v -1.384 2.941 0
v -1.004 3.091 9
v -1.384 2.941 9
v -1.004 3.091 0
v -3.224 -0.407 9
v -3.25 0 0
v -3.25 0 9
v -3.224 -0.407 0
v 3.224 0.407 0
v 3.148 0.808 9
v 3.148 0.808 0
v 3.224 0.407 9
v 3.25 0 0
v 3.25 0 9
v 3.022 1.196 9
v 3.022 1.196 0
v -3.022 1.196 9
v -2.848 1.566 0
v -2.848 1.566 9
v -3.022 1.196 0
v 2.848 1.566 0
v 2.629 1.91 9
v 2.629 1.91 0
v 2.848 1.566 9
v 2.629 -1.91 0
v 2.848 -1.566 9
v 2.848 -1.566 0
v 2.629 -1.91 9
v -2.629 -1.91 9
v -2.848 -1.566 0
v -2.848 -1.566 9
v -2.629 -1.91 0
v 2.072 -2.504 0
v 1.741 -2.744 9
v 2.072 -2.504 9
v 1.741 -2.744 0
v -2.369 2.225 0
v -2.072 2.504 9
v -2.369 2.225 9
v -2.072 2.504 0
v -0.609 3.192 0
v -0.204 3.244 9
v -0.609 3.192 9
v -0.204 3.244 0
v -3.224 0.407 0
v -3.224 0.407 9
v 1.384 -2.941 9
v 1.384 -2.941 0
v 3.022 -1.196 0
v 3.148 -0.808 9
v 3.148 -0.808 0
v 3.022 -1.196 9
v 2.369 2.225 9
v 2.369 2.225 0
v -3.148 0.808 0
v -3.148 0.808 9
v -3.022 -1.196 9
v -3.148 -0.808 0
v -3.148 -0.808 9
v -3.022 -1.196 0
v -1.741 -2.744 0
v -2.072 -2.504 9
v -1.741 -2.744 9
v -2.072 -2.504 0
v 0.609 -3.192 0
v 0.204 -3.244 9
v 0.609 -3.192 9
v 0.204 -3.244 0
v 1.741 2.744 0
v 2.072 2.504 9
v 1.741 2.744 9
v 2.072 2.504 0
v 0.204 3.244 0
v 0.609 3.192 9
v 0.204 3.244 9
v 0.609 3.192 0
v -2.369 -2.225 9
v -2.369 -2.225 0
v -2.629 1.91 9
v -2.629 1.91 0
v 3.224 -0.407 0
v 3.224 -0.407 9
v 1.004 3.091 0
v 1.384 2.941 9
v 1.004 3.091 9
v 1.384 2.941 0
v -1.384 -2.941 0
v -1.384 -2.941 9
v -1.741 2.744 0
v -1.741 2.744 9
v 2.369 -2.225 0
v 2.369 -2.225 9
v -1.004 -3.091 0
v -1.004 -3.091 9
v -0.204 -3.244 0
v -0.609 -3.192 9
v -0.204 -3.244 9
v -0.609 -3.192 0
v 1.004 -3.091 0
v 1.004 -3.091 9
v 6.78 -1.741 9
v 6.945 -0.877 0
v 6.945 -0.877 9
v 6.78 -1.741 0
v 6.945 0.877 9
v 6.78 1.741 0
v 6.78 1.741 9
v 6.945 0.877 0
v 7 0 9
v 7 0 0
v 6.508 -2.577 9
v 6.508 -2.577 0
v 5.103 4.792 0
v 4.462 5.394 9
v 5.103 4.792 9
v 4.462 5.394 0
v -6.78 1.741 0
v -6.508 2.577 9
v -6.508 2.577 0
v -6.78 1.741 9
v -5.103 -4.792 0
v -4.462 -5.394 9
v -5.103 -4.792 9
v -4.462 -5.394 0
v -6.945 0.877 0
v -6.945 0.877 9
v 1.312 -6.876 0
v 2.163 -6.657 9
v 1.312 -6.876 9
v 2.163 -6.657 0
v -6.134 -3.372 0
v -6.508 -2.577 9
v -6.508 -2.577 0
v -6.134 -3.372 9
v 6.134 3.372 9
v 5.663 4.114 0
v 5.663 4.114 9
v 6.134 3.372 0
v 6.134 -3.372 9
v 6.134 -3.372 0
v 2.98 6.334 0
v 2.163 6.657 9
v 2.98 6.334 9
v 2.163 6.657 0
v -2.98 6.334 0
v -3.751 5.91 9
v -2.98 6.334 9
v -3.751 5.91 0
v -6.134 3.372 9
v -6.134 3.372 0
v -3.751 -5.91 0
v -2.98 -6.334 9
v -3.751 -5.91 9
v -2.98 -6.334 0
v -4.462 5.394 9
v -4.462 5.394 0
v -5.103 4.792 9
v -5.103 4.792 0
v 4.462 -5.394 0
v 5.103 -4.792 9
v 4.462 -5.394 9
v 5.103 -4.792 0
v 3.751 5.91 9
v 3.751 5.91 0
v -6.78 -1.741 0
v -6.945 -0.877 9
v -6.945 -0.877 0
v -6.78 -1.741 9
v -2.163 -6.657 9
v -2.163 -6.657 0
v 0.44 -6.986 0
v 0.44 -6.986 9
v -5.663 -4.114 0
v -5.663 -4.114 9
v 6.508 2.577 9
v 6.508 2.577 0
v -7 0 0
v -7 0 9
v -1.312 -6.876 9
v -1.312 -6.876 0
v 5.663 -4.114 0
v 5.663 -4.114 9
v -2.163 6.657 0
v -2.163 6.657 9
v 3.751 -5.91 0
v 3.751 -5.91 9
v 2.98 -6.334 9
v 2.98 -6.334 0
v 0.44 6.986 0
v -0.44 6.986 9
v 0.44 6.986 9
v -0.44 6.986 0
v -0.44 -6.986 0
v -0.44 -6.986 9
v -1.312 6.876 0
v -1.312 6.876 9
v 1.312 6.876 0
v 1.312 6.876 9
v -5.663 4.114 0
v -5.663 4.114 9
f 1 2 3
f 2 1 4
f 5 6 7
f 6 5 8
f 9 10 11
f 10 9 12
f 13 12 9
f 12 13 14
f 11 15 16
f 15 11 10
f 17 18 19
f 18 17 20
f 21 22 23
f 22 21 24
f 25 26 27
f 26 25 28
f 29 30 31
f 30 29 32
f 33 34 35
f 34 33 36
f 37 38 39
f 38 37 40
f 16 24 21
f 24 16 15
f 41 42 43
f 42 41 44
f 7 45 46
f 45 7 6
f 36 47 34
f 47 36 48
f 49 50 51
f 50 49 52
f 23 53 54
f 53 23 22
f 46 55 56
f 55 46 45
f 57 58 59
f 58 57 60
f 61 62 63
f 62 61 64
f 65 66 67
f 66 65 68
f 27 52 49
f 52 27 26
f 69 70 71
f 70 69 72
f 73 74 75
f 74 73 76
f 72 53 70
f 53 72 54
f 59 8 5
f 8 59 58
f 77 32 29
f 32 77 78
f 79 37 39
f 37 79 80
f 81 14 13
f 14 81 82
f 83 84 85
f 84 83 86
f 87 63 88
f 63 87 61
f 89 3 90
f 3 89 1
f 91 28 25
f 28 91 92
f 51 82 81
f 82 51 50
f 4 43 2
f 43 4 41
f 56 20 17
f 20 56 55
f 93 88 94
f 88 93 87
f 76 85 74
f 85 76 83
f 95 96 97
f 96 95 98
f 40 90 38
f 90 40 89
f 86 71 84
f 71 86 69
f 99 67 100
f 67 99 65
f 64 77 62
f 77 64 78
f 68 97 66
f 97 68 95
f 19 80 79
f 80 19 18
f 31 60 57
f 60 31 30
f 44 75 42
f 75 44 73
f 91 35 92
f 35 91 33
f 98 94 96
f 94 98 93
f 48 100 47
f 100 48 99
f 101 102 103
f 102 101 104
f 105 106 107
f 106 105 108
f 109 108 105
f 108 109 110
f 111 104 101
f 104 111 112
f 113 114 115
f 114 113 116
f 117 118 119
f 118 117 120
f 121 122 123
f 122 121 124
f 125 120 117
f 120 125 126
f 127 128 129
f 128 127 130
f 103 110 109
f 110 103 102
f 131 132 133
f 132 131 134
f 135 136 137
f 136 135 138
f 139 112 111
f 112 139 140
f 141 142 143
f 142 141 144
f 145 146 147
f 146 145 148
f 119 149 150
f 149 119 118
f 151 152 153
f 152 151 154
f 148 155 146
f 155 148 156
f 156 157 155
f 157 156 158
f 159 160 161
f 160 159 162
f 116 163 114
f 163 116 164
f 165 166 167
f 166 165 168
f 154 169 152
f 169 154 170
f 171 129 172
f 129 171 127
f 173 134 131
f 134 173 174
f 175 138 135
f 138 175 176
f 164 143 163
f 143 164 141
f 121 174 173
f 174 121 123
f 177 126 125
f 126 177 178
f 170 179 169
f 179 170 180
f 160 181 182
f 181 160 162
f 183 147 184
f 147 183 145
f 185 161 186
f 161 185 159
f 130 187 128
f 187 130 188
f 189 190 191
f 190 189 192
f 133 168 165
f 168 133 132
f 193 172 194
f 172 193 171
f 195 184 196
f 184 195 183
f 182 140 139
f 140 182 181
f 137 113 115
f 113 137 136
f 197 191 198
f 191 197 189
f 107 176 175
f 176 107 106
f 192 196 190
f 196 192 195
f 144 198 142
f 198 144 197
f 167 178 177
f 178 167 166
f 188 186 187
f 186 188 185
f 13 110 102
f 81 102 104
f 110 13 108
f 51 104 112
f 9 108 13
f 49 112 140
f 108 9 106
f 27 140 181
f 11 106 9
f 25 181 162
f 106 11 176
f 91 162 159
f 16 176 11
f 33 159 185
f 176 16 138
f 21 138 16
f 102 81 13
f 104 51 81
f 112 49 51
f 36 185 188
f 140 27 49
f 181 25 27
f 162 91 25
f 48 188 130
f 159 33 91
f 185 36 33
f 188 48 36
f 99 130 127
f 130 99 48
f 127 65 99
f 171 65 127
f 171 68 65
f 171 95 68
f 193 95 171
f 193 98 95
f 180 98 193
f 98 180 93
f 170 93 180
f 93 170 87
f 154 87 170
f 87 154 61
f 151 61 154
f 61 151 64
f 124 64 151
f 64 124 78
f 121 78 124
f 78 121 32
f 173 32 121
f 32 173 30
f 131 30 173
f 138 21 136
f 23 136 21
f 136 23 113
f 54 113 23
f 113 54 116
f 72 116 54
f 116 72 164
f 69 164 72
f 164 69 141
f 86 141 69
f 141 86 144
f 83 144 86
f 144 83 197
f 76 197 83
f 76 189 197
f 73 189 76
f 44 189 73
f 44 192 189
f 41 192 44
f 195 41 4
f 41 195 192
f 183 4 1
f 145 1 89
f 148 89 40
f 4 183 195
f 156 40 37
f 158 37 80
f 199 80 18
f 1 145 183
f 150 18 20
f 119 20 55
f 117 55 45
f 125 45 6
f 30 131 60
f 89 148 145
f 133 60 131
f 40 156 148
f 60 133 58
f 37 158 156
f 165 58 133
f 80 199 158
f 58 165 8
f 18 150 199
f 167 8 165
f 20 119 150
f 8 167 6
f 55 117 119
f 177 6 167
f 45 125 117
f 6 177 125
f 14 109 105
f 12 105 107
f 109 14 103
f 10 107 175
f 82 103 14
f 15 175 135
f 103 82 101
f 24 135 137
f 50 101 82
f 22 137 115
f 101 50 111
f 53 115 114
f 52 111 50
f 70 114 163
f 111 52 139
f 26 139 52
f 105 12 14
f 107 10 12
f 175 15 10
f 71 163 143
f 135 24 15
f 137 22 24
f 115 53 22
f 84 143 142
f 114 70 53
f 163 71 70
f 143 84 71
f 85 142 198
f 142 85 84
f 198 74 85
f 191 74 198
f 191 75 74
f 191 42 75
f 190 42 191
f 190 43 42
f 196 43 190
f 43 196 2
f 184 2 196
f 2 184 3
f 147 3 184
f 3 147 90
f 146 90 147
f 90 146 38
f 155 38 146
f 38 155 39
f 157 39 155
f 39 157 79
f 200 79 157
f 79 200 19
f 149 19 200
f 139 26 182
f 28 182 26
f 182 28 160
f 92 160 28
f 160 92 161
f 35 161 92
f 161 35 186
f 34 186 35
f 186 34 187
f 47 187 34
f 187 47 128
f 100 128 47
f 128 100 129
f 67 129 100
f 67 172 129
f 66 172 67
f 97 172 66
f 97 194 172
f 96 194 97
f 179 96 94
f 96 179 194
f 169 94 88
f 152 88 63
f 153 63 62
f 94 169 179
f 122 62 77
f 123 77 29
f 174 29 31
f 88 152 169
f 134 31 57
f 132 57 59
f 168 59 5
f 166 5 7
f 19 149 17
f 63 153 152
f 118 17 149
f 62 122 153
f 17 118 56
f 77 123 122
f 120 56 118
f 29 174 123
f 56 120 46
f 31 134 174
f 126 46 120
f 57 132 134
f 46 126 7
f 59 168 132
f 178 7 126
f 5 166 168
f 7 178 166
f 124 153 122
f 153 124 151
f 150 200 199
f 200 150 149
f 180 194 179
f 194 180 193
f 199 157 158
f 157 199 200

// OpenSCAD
$fn = 50;


difference() {
	union() {
		*color(alpha = 1.0000000000, c = "gray") {
			translate(v = [0, 7, 0]) {
				linear_extrude(height = 1) {
					text(font = "Arial:style=Bold", halign = "center", size = 4.5000000000, text = "COMMENT plate main", valign = "center");
				}
			}
		}
		cylinder(h = 9, r = 7.0000000000);
	}
	union() {
		*color(alpha = 1.0000000000, c = "gray") {
			translate(v = [0, 7, 0]) {
				linear_extrude(height = 1) {
					text(font = "Arial:style=Bold", halign = "center", size = 4.5000000000, text = "COMMENT holes main", valign = "center");
				}
			}
		}
		translate(v = [0, 0, -100]) {
			cylinder(h = 200, r = 3.2500000000);
		}
		translate(v = [0, 0, -100]) {
			cylinder(h = 200, r = 1.8000000000);
		}
	}
}
